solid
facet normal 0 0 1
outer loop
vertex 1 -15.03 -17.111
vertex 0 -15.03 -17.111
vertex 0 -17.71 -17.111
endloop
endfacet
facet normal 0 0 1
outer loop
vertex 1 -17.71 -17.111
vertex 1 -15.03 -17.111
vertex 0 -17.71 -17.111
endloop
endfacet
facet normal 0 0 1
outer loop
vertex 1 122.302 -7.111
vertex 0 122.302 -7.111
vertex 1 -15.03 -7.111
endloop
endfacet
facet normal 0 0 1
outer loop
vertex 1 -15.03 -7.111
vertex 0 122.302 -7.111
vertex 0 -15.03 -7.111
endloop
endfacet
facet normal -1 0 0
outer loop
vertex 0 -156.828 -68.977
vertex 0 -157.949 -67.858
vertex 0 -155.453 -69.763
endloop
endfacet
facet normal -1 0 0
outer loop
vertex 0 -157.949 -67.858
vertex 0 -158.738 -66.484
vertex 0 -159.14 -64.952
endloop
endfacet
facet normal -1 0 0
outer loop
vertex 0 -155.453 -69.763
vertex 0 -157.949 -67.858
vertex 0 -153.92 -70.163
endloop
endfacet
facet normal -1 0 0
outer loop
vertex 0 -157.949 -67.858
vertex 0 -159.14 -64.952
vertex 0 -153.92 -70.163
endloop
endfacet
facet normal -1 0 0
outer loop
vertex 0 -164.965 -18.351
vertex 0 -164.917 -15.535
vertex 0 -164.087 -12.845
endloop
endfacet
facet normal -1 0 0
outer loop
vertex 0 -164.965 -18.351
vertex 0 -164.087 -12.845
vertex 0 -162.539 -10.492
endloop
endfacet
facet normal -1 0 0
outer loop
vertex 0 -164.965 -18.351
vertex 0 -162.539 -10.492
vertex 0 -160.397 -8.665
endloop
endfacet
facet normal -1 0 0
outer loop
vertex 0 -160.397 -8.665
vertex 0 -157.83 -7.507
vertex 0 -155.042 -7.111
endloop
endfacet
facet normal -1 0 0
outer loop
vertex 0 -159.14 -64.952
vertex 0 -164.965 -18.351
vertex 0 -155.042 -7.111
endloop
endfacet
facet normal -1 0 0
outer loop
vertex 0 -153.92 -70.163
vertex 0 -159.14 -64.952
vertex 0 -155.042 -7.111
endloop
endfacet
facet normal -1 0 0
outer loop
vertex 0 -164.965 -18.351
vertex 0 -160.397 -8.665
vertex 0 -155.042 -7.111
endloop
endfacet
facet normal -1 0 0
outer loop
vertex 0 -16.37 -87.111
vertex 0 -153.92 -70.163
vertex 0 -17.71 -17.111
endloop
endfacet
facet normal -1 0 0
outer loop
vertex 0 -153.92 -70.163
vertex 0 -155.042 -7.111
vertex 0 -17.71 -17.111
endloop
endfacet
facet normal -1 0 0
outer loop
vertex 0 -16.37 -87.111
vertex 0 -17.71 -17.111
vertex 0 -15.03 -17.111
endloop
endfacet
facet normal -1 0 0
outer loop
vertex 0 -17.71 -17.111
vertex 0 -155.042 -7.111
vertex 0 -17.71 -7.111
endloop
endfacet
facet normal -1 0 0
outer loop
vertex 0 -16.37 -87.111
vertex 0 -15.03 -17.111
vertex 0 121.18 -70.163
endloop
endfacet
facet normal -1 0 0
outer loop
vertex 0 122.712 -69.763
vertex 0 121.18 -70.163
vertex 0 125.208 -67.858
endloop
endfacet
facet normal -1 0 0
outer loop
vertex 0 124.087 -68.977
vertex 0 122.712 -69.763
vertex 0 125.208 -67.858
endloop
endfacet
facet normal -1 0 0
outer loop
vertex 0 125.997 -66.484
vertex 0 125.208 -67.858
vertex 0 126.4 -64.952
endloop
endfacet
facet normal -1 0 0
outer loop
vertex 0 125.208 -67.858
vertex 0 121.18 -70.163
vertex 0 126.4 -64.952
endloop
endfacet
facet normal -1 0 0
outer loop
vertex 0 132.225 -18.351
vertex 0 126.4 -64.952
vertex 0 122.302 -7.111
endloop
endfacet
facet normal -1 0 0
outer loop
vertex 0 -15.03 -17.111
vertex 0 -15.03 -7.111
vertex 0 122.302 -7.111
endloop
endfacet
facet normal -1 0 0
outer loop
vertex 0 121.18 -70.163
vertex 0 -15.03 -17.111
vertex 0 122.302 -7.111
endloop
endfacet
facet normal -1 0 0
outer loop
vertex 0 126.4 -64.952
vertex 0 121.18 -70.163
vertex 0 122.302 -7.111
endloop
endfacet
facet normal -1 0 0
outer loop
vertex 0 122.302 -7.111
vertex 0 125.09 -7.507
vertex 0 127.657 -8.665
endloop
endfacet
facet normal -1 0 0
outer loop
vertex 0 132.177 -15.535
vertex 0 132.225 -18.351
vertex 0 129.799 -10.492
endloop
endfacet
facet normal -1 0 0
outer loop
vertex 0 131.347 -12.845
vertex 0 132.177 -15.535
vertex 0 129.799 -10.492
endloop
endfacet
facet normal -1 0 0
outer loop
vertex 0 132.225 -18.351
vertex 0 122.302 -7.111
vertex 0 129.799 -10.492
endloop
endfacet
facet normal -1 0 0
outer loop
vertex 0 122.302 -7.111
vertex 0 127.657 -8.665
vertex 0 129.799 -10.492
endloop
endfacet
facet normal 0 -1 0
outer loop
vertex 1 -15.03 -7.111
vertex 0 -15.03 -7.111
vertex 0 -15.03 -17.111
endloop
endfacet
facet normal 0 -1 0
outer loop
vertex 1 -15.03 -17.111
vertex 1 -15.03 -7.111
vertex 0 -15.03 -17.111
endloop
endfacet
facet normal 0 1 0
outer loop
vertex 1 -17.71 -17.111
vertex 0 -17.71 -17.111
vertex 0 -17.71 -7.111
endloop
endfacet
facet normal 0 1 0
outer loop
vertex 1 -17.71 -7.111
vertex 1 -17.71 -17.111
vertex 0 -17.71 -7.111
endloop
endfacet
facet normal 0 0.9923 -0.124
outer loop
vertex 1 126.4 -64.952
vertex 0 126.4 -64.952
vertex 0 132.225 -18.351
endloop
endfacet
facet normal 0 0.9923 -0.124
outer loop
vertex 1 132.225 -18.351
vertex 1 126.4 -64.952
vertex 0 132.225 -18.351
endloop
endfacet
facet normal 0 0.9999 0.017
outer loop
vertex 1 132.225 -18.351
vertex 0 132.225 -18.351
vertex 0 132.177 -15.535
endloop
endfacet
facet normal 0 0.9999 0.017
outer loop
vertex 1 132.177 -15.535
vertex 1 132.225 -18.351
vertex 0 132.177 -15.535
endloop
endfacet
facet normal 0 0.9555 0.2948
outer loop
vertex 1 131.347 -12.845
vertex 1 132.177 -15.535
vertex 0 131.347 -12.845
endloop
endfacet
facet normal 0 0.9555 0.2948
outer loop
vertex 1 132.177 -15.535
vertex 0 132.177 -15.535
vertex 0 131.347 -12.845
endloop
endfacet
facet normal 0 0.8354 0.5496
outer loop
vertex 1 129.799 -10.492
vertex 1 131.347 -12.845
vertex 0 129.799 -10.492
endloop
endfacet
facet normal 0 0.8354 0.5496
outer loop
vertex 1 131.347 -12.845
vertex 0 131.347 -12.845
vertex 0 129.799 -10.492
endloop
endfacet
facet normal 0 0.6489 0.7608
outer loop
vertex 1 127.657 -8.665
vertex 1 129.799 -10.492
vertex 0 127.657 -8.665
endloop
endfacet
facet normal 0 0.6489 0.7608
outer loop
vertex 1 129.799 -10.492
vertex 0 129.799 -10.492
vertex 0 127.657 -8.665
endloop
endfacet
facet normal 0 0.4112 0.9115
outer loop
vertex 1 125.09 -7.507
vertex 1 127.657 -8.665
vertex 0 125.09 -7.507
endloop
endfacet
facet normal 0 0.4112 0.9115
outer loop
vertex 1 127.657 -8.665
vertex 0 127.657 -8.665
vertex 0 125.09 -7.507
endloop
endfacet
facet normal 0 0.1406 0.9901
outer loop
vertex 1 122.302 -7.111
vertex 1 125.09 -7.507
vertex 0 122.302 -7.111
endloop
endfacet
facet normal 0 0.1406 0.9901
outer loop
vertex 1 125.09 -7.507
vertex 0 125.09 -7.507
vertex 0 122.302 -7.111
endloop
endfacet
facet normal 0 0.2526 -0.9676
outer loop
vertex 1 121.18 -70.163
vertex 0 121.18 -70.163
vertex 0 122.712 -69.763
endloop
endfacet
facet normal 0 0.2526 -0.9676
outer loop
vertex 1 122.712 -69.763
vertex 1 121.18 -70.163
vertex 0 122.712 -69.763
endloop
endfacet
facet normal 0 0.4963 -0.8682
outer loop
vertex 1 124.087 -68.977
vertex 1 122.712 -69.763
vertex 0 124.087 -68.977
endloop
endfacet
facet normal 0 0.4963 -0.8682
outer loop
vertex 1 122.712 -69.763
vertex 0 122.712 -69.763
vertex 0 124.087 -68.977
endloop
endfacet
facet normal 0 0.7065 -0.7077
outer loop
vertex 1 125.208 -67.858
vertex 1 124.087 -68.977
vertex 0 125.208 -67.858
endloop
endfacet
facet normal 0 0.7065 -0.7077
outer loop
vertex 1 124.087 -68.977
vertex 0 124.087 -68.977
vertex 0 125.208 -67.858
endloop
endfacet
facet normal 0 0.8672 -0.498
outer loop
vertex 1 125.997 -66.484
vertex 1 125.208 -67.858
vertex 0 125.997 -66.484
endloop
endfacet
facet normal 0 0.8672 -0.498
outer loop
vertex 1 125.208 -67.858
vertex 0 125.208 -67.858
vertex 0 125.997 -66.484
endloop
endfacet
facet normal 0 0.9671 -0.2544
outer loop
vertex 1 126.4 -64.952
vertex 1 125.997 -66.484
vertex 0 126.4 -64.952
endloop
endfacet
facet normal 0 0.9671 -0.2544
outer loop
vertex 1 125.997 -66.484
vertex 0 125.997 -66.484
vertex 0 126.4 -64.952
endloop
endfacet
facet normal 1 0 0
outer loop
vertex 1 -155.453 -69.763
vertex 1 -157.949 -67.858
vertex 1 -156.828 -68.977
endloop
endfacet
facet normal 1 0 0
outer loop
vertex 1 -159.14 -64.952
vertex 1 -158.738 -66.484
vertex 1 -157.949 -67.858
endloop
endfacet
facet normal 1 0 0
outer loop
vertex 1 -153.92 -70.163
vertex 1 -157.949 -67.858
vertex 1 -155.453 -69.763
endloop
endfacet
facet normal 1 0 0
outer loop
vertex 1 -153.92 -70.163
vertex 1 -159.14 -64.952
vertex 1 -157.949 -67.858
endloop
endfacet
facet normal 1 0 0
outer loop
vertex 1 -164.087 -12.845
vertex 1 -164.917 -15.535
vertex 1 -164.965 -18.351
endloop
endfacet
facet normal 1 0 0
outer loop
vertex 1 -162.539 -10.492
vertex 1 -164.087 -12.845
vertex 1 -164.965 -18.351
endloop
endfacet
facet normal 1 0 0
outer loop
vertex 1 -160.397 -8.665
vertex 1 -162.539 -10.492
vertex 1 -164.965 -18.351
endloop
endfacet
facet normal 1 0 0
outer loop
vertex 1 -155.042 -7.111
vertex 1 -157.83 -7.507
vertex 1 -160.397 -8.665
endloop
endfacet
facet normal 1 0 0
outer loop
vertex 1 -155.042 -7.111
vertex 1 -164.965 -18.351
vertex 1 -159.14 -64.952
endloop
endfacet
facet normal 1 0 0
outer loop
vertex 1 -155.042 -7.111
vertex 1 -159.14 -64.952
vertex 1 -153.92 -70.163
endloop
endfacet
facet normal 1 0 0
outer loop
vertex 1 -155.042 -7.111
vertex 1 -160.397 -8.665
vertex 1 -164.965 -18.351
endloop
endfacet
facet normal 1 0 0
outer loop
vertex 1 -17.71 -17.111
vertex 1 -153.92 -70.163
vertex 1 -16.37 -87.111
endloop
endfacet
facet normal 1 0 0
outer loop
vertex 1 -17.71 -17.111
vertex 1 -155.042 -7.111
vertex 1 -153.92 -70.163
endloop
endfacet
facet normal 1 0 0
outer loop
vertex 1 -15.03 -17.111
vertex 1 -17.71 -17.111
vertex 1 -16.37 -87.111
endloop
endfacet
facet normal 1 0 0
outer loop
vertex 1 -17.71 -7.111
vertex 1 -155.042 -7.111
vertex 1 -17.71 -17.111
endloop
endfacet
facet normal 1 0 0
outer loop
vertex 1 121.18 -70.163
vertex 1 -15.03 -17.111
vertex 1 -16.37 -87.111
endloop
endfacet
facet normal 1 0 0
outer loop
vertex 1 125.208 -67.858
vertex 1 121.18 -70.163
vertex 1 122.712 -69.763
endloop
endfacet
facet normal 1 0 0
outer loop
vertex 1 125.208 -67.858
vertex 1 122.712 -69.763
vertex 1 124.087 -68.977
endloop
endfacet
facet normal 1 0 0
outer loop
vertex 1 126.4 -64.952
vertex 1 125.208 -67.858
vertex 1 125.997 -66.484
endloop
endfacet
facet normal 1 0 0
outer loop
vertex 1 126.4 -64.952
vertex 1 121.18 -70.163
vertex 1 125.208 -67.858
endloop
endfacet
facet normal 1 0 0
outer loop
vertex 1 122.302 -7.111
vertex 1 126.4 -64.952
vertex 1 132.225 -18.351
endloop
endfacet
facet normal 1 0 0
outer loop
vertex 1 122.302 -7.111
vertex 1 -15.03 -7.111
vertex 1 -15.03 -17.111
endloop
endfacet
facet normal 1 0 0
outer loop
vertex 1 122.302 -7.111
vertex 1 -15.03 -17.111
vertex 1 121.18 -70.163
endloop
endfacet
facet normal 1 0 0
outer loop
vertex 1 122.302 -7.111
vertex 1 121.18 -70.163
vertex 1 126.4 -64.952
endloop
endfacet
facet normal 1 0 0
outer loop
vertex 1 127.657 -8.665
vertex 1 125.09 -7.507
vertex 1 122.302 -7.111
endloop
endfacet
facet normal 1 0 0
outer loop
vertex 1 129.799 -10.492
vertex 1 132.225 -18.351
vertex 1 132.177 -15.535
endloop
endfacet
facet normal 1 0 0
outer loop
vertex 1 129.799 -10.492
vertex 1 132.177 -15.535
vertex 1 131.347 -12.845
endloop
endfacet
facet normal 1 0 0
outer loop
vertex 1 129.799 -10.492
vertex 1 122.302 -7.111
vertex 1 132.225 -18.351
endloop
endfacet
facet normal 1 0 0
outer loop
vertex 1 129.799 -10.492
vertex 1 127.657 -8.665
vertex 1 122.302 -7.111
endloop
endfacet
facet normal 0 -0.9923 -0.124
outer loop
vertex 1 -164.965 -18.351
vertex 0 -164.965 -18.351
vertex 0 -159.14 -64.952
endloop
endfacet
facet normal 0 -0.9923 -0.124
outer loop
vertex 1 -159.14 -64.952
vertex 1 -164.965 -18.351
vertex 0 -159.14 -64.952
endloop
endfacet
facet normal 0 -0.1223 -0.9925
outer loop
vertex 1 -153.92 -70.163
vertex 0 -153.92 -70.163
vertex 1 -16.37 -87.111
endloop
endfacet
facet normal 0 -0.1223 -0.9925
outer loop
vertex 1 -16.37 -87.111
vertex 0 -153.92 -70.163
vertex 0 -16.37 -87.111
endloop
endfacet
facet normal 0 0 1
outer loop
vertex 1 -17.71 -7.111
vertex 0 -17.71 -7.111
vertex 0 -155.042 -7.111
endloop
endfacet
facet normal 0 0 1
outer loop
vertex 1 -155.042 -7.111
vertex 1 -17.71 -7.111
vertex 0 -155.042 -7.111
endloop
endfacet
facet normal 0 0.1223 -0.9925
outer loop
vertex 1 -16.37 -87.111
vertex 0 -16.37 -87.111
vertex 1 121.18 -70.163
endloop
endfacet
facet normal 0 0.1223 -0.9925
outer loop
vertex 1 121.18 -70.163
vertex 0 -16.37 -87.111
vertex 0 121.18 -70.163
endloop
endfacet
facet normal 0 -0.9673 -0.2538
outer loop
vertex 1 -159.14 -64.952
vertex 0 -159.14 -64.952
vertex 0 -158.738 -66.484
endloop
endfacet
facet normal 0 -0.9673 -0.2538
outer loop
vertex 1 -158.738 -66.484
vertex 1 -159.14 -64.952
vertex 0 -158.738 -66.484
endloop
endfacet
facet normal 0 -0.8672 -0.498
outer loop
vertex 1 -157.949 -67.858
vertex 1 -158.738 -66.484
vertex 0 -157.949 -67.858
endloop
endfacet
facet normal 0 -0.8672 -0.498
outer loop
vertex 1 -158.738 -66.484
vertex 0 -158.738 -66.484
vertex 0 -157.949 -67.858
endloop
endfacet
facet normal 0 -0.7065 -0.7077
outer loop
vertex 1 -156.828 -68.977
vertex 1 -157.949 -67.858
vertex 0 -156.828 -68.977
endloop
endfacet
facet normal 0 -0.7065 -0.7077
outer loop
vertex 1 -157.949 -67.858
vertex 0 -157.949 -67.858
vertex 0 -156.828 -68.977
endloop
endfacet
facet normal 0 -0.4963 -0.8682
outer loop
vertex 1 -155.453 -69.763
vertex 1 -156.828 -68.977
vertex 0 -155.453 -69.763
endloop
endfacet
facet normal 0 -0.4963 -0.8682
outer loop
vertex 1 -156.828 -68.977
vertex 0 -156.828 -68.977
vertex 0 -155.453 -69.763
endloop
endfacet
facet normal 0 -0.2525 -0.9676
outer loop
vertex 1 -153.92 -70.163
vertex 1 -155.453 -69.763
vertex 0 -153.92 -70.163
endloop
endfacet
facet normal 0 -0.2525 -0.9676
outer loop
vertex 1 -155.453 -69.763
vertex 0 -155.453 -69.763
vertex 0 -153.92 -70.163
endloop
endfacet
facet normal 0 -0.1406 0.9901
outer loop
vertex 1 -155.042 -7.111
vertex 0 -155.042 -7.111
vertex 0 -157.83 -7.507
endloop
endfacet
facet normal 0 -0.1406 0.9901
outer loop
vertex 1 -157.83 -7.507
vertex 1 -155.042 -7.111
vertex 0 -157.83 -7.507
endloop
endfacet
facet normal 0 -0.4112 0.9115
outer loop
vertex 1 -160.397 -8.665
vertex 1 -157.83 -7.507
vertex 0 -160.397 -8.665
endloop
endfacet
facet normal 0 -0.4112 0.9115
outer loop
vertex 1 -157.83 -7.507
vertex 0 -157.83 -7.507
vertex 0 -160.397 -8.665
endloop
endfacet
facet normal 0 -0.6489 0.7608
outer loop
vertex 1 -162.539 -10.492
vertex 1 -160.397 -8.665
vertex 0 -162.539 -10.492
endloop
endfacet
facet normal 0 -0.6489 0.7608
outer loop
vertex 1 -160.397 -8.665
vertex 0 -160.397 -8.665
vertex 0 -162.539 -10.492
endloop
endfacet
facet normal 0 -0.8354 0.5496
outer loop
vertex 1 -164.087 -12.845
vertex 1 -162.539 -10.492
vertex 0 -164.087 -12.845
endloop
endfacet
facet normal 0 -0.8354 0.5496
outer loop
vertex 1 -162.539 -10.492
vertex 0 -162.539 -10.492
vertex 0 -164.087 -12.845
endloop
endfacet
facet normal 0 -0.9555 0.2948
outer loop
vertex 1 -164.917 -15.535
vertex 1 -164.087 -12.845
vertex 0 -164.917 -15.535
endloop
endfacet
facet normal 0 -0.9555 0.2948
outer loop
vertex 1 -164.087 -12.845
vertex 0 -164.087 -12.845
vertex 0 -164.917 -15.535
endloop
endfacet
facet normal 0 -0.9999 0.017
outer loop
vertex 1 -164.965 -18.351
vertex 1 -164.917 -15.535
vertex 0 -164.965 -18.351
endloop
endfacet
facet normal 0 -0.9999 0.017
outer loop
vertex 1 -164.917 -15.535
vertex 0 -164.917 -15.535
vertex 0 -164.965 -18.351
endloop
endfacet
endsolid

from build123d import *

# Parameters (mm, degrees)
F1_DEPTH = 1


# Not quite as in the source:
# - ends of sketch curves that miss each other by under 0.0002 mm in the source are joined


with BuildPart() as f1:
    # F0 (on Right) → F1 (new body)
    with BuildSketch(Plane.YZ):
        with BuildLine():
            Line((-17.710118, -7.110515), (-155.042295, -7.110515))
            ThreePointArc((-155.042295, -7.110515), (-162.539076635, -10.4924892282), (-164.9650738133, -18.3508619767))
            Line((-164.9650738133, -18.3508619767), (-159.139913, -64.952155))
            ThreePointArc((-159.139913, -64.952155), (-157.4251457547, -68.4543233257), (-153.91996093, -70.1629154318))
            Line((-153.91996093, -70.1629154318), (-16.370118, -87.110515))
            Line((-16.370118, -87.110515), (121.179726, -70.162916))
            ThreePointArc((121.179726, -70.162916), (124.6849107108, -68.4543233695), (126.3996771834, -64.9521550229))
            Line((126.3996771834, -64.9521550229), (132.224839, -18.350862))
            ThreePointArc((132.224839, -18.350862), (129.798841635, -10.4924892282), (122.30206, -7.110515))
            Line((122.30206, -7.110515), (-15.030118, -7.110515))
            Line((-15.030118, -7.110515), (-15.030118, -17.110515))
            Line((-15.030118, -17.110515), (-17.710118, -17.110515))
            Line((-17.710118, -17.110515), (-17.710118, -7.110515))
        make_face()
    extrude(amount=F1_DEPTH)


solid = f1.part
